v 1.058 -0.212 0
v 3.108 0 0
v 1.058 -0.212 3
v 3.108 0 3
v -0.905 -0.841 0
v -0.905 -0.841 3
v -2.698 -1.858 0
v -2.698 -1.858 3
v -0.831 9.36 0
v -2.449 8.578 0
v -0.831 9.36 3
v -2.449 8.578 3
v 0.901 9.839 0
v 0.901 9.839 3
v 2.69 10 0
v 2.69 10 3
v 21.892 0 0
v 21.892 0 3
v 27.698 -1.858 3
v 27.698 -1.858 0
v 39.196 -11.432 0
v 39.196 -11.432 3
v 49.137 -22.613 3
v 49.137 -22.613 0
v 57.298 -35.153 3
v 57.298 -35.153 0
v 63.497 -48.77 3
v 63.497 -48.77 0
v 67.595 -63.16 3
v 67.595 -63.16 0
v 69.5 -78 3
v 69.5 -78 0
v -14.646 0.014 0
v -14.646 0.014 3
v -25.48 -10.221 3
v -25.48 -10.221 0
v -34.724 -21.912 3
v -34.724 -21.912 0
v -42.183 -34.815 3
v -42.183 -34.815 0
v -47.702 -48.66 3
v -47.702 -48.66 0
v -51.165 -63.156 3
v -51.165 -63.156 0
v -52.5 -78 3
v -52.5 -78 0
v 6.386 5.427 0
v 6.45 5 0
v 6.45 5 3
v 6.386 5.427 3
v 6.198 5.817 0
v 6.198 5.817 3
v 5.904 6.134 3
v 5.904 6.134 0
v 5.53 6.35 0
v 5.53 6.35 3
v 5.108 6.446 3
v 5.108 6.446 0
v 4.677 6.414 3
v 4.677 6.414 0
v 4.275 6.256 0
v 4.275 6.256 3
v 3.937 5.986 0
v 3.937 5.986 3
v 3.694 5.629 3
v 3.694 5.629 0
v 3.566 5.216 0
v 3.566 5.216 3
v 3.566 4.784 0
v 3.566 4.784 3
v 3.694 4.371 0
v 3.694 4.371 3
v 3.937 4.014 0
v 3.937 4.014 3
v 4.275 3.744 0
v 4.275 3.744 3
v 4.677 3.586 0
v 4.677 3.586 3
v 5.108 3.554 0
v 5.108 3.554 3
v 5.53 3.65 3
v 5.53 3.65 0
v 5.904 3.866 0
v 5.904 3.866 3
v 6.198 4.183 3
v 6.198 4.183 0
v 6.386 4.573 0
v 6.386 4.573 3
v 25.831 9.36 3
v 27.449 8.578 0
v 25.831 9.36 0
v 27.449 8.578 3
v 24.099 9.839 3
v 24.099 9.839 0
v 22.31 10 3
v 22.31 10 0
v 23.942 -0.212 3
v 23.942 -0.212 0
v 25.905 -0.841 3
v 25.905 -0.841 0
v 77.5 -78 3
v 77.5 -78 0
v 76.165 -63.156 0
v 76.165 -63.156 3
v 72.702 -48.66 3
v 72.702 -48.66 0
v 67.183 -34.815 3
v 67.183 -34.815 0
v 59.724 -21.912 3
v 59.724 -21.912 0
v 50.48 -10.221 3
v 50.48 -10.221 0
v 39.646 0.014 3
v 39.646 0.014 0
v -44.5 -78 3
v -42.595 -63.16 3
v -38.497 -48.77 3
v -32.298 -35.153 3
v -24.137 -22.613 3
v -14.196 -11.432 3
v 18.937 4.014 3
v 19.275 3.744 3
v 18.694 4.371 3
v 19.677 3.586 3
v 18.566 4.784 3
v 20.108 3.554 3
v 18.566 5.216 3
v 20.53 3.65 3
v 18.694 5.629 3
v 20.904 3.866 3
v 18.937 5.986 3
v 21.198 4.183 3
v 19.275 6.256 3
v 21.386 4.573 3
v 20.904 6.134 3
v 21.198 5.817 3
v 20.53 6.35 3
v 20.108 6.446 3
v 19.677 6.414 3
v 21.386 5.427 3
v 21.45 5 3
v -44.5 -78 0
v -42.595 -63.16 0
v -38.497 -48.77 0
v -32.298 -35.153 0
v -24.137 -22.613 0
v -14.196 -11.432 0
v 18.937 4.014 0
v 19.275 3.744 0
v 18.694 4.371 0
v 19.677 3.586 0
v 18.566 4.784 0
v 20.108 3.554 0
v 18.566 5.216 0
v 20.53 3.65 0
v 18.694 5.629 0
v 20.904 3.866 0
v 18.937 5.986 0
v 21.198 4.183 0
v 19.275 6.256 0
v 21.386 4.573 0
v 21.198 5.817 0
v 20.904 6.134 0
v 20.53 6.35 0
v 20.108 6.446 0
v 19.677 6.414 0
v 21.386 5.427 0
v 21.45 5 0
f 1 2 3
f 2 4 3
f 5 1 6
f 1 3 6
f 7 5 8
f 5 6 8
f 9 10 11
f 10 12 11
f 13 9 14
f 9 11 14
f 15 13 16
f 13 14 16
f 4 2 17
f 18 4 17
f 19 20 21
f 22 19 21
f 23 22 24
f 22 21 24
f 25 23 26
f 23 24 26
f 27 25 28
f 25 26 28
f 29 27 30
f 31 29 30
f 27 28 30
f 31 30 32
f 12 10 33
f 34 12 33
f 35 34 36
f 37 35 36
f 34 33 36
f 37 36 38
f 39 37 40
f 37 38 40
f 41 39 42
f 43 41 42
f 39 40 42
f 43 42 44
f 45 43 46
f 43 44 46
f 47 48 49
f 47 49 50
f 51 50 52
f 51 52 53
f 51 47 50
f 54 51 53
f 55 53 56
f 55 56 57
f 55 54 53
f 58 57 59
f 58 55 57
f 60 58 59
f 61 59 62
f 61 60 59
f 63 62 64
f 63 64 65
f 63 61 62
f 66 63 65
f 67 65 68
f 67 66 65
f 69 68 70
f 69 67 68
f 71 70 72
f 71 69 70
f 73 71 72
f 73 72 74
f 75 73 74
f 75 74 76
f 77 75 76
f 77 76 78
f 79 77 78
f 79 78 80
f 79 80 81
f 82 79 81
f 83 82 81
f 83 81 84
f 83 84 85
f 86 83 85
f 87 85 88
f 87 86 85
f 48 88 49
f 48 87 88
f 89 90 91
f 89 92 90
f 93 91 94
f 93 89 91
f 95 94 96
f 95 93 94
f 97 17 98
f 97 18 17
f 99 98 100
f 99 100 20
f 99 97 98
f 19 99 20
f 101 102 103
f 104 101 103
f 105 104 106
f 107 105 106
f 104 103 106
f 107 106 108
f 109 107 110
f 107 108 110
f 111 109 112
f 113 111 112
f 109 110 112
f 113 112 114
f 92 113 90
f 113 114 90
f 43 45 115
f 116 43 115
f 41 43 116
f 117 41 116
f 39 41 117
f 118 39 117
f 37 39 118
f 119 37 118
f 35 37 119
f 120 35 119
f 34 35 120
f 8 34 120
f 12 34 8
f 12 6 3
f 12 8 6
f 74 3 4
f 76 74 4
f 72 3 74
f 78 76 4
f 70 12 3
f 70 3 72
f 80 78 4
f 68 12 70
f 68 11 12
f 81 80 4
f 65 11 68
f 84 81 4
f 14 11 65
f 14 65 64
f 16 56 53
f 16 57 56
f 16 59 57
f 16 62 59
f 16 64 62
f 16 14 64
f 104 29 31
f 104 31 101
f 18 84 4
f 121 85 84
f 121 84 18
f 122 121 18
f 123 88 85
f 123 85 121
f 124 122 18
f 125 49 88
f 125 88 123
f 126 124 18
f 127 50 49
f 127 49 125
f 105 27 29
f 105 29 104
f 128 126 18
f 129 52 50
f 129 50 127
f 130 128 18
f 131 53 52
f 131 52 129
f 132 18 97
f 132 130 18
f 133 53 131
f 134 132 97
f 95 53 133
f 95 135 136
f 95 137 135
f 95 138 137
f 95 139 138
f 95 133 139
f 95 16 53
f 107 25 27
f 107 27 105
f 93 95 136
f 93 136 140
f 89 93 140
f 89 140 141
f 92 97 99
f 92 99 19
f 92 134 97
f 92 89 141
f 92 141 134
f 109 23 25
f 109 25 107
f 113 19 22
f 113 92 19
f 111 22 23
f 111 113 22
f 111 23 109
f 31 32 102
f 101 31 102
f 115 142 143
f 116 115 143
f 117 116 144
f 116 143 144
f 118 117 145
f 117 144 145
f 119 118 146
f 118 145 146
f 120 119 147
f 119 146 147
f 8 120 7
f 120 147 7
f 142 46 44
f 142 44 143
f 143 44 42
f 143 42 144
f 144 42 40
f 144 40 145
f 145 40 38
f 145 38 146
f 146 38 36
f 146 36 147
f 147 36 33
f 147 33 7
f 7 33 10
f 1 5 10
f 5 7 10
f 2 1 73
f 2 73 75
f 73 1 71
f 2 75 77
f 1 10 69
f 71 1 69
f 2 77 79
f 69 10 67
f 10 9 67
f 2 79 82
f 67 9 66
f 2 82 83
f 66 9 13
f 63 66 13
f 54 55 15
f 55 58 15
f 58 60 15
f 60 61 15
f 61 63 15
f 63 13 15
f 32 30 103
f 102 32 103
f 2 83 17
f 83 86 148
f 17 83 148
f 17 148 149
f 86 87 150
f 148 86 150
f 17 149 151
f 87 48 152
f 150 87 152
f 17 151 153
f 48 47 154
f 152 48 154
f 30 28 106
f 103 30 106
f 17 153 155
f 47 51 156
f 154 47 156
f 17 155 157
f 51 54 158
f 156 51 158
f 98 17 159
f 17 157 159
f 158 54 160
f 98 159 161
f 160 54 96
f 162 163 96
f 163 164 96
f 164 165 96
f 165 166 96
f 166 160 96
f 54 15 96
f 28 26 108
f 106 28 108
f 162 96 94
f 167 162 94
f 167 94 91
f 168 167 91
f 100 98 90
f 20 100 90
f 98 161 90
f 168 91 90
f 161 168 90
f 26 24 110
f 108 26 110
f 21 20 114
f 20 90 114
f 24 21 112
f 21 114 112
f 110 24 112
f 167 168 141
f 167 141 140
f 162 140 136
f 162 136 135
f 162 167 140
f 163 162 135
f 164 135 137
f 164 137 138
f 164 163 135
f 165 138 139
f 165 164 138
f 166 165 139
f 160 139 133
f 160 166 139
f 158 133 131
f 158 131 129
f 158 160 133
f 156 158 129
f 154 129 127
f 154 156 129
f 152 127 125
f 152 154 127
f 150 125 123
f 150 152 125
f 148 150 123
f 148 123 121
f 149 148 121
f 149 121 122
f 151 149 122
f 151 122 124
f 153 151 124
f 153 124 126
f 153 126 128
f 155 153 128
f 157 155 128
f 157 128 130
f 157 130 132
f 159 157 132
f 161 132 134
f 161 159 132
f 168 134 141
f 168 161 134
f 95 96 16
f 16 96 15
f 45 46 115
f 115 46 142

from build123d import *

# Parameters (mm, degrees)
SKETCH_1_R      = 1.45
EXTRUDE_1_DEPTH = 3
FILLET_1_R      = 10


with BuildPart() as part:
    # 草图1 → 凸台-拉伸1 (new body)
    with BuildSketch(Plane.XY):
        with BuildLine():
            Line((0, 0), (25, 0))
            ThreePointArc((25, 0), (56.497933188, -33.723935553), (69.5, -78))
            Line((69.5, -78), (77.5, -78))
            ThreePointArc((77.5, -78), (62.96989722, -27.008015863), (25, 10))
            Line((25, 10), (0, 10))
            ThreePointArc((0, 10), (-37.96989722, -27.008015863), (-52.5, -78))
            Line((-52.5, -78), (-44.5, -78))
            ThreePointArc((-44.5, -78), (-31.497933188, -33.723935553), (0, 0))
        make_face()
        with Locations((5, 5)):
            Circle(SKETCH_1_R, mode=Mode.SUBTRACT)
        with Locations((20, 5)):
            Circle(SKETCH_1_R, mode=Mode.SUBTRACT)
    extrude(amount=EXTRUDE_1_DEPTH)

    # 圆角1
    fillet_1_edges = [part.edges().sort_by_distance(p)[0] for p in [
        (0, 10, 1.5),
        (25, 10, 1.5),
        (25, 0, 1.5),
        (0, 0, 1.5),
    ]]
    fillet(fillet_1_edges, radius=FILLET_1_R)


solid = part.part
